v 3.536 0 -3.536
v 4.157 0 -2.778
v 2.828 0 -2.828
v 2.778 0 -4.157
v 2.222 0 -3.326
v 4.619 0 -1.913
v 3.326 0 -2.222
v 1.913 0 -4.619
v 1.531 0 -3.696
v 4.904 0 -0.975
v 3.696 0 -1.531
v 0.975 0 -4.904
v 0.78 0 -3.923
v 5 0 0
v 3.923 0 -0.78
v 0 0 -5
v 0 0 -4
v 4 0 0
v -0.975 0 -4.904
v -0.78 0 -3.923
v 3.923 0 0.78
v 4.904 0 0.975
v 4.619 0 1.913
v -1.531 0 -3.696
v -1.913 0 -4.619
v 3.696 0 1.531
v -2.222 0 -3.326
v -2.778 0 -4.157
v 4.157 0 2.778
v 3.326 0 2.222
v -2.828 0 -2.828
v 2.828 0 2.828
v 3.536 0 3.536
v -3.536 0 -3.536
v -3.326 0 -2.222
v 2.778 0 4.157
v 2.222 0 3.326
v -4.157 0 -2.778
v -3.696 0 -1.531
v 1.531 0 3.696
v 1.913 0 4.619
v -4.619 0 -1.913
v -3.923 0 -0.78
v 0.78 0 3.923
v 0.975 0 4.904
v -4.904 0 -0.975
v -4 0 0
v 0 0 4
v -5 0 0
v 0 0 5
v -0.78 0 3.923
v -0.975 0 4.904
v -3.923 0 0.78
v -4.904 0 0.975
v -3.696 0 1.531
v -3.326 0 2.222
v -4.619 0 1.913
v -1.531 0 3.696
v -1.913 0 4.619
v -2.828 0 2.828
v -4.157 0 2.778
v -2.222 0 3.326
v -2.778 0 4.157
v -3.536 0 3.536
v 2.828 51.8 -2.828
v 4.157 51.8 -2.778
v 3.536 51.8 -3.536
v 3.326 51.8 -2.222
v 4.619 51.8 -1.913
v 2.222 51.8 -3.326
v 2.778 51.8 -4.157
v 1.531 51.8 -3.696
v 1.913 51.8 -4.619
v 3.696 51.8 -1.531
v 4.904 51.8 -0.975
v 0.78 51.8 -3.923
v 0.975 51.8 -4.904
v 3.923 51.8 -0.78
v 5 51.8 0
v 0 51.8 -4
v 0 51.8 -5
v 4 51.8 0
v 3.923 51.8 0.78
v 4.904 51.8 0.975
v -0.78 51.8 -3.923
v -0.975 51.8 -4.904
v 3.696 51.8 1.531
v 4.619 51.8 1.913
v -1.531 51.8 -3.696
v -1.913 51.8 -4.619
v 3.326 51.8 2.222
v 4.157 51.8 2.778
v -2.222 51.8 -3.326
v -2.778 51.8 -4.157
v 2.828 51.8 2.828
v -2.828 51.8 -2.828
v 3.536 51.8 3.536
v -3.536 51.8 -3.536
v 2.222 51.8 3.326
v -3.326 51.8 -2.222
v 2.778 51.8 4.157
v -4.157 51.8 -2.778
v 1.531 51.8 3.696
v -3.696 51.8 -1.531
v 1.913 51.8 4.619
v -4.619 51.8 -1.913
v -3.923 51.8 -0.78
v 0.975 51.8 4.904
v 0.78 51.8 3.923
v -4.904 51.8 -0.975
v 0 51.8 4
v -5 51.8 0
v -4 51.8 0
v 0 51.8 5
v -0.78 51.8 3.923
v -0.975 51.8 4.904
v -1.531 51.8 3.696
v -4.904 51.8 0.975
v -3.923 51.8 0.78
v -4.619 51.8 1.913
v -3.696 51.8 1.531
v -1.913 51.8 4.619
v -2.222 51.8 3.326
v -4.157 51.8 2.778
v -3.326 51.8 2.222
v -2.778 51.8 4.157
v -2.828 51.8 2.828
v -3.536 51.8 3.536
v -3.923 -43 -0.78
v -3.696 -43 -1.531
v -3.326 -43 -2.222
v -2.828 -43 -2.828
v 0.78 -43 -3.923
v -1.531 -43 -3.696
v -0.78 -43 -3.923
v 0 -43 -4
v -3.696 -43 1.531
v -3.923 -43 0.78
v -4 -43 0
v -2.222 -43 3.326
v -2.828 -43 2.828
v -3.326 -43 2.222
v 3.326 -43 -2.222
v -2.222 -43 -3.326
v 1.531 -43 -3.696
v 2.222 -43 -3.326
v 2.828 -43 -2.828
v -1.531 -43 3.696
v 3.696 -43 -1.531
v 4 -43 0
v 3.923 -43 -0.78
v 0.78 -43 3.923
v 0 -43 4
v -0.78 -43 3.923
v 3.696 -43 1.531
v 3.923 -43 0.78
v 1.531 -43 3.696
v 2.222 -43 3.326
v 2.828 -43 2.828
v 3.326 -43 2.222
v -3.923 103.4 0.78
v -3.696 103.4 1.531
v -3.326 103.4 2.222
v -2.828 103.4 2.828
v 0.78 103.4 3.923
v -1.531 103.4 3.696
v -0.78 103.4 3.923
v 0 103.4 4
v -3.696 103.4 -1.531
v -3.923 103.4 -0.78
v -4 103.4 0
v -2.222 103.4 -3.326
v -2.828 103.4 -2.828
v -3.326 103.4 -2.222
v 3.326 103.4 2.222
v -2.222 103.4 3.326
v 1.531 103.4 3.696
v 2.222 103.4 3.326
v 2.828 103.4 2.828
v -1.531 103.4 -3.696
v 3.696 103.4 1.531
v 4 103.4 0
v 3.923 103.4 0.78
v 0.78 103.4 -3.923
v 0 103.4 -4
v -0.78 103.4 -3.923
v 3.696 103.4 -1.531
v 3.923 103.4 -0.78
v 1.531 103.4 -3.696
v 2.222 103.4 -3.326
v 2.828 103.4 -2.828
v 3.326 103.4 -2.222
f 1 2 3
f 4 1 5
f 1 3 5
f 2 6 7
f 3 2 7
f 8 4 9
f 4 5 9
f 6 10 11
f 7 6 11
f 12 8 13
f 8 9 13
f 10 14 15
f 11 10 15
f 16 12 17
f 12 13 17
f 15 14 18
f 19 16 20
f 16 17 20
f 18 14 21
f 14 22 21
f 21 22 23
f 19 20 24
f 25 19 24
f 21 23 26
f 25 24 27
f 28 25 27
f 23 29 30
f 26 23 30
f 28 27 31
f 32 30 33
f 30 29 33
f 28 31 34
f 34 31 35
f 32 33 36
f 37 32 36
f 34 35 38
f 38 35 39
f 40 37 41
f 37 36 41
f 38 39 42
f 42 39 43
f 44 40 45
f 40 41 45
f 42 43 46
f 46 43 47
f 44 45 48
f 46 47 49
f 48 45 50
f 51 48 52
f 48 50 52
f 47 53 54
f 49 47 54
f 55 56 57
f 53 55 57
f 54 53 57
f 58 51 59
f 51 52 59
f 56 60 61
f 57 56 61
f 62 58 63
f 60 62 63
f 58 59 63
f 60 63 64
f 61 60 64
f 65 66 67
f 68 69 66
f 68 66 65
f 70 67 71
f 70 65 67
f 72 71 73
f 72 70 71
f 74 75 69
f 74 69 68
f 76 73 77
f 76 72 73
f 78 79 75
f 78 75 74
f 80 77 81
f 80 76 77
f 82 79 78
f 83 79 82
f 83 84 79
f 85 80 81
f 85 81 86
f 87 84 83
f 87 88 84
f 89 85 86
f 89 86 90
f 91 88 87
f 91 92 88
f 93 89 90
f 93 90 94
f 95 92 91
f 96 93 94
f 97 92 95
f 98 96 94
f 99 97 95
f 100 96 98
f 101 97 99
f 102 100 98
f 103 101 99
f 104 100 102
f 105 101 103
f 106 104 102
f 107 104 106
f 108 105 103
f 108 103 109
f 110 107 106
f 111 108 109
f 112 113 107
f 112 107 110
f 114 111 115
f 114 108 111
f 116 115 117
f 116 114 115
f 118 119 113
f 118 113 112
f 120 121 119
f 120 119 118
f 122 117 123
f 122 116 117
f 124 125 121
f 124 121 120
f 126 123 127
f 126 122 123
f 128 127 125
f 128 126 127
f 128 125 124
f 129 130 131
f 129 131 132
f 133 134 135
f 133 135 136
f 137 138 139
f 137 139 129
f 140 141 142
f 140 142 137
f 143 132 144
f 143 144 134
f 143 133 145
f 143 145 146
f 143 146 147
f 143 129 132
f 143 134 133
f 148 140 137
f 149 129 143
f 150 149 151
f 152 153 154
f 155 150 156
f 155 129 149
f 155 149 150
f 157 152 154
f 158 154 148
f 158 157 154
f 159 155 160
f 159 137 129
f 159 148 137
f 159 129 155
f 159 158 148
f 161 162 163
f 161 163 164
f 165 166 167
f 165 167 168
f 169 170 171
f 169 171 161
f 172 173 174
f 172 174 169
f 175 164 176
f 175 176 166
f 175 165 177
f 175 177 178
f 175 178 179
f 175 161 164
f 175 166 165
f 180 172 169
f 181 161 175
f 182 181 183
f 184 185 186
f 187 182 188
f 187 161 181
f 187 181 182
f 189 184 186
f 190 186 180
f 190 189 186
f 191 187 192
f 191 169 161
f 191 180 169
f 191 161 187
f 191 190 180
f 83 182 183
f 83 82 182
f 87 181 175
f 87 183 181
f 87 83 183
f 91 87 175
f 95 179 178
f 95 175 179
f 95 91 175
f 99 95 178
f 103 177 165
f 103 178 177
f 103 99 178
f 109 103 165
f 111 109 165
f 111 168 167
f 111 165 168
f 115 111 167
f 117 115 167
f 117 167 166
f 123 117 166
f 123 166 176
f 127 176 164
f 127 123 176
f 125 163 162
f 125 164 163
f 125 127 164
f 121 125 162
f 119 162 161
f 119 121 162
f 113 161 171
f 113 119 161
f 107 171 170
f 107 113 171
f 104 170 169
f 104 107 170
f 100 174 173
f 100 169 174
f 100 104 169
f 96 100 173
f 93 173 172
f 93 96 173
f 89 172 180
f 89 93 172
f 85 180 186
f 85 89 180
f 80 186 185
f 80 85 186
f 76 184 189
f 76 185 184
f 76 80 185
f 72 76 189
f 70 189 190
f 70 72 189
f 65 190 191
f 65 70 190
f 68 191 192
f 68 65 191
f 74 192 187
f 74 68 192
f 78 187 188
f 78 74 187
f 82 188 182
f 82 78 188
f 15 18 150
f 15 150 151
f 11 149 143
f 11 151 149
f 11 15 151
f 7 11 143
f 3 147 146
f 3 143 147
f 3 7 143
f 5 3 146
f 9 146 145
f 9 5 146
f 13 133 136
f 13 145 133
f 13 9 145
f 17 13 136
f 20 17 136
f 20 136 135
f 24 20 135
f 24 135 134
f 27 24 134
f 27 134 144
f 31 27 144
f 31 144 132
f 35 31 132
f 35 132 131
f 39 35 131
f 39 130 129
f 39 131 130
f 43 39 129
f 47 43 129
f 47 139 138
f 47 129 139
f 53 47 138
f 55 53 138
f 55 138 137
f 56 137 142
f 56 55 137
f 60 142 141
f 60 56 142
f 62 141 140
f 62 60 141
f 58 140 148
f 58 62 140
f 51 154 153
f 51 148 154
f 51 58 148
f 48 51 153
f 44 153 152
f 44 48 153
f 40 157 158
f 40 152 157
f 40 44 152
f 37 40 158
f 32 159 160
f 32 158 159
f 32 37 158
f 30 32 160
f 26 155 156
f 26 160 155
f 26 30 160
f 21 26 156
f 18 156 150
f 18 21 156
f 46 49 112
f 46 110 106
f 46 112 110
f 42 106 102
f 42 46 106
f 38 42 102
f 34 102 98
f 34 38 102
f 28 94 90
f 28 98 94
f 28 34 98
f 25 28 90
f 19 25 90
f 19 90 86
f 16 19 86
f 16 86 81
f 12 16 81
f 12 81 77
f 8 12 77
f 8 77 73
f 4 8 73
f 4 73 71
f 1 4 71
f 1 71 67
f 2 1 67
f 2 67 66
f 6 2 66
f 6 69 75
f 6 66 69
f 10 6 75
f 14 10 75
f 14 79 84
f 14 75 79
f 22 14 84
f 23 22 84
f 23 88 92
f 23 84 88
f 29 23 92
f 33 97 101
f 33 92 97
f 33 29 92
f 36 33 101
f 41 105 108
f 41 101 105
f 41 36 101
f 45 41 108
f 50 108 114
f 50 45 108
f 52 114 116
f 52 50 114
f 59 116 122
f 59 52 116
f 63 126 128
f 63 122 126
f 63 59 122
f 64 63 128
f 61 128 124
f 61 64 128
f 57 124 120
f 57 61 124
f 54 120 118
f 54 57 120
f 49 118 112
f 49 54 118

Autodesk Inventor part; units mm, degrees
ref_plane "YZ Plane" through (0, 0, 0) normal (1, 0, 0) x (0, 1, 0)
ref_plane "XZ Plane" through (0, 0, 0) normal (0, 1, 0) x (-1, 0, 0)
ref_plane "XY Plane" through (0, 0, 0) normal (0, 0, 1) x (1, 0, 0)
sketch "スケッチ1" plane through (0, 0, 0) normal (0, 1, 0) x (-1, 0, 0)
  circle A0 centre (0, 0) radius 5
  dimension "d0" = 10
extrude "押し出し1" add sketch "スケッチ1" along normal blind 51.8
sketch "スケッチ2" plane through (0, 51.8, 0) normal (0, 1, 0) x (1, 0, 0)
  circle A0 centre (0, 0) radius 4
  dimension "d3" = 8
extrude "押し出し2" add sketch "スケッチ2" along normal blind 51.6
sketch "スケッチ3" plane through (0, 0, 0) normal (0, -1, 0) x (1, 0, 0)
  circle A0 centre (0, 0) radius 5 projected
  circle A1 centre (0, 0) radius 4
  dimension "d6" = 8
extrude "押し出し3" add sketch "スケッチ3" along normal blind 43 contours A1
properties part number "elbow_shaft3"
